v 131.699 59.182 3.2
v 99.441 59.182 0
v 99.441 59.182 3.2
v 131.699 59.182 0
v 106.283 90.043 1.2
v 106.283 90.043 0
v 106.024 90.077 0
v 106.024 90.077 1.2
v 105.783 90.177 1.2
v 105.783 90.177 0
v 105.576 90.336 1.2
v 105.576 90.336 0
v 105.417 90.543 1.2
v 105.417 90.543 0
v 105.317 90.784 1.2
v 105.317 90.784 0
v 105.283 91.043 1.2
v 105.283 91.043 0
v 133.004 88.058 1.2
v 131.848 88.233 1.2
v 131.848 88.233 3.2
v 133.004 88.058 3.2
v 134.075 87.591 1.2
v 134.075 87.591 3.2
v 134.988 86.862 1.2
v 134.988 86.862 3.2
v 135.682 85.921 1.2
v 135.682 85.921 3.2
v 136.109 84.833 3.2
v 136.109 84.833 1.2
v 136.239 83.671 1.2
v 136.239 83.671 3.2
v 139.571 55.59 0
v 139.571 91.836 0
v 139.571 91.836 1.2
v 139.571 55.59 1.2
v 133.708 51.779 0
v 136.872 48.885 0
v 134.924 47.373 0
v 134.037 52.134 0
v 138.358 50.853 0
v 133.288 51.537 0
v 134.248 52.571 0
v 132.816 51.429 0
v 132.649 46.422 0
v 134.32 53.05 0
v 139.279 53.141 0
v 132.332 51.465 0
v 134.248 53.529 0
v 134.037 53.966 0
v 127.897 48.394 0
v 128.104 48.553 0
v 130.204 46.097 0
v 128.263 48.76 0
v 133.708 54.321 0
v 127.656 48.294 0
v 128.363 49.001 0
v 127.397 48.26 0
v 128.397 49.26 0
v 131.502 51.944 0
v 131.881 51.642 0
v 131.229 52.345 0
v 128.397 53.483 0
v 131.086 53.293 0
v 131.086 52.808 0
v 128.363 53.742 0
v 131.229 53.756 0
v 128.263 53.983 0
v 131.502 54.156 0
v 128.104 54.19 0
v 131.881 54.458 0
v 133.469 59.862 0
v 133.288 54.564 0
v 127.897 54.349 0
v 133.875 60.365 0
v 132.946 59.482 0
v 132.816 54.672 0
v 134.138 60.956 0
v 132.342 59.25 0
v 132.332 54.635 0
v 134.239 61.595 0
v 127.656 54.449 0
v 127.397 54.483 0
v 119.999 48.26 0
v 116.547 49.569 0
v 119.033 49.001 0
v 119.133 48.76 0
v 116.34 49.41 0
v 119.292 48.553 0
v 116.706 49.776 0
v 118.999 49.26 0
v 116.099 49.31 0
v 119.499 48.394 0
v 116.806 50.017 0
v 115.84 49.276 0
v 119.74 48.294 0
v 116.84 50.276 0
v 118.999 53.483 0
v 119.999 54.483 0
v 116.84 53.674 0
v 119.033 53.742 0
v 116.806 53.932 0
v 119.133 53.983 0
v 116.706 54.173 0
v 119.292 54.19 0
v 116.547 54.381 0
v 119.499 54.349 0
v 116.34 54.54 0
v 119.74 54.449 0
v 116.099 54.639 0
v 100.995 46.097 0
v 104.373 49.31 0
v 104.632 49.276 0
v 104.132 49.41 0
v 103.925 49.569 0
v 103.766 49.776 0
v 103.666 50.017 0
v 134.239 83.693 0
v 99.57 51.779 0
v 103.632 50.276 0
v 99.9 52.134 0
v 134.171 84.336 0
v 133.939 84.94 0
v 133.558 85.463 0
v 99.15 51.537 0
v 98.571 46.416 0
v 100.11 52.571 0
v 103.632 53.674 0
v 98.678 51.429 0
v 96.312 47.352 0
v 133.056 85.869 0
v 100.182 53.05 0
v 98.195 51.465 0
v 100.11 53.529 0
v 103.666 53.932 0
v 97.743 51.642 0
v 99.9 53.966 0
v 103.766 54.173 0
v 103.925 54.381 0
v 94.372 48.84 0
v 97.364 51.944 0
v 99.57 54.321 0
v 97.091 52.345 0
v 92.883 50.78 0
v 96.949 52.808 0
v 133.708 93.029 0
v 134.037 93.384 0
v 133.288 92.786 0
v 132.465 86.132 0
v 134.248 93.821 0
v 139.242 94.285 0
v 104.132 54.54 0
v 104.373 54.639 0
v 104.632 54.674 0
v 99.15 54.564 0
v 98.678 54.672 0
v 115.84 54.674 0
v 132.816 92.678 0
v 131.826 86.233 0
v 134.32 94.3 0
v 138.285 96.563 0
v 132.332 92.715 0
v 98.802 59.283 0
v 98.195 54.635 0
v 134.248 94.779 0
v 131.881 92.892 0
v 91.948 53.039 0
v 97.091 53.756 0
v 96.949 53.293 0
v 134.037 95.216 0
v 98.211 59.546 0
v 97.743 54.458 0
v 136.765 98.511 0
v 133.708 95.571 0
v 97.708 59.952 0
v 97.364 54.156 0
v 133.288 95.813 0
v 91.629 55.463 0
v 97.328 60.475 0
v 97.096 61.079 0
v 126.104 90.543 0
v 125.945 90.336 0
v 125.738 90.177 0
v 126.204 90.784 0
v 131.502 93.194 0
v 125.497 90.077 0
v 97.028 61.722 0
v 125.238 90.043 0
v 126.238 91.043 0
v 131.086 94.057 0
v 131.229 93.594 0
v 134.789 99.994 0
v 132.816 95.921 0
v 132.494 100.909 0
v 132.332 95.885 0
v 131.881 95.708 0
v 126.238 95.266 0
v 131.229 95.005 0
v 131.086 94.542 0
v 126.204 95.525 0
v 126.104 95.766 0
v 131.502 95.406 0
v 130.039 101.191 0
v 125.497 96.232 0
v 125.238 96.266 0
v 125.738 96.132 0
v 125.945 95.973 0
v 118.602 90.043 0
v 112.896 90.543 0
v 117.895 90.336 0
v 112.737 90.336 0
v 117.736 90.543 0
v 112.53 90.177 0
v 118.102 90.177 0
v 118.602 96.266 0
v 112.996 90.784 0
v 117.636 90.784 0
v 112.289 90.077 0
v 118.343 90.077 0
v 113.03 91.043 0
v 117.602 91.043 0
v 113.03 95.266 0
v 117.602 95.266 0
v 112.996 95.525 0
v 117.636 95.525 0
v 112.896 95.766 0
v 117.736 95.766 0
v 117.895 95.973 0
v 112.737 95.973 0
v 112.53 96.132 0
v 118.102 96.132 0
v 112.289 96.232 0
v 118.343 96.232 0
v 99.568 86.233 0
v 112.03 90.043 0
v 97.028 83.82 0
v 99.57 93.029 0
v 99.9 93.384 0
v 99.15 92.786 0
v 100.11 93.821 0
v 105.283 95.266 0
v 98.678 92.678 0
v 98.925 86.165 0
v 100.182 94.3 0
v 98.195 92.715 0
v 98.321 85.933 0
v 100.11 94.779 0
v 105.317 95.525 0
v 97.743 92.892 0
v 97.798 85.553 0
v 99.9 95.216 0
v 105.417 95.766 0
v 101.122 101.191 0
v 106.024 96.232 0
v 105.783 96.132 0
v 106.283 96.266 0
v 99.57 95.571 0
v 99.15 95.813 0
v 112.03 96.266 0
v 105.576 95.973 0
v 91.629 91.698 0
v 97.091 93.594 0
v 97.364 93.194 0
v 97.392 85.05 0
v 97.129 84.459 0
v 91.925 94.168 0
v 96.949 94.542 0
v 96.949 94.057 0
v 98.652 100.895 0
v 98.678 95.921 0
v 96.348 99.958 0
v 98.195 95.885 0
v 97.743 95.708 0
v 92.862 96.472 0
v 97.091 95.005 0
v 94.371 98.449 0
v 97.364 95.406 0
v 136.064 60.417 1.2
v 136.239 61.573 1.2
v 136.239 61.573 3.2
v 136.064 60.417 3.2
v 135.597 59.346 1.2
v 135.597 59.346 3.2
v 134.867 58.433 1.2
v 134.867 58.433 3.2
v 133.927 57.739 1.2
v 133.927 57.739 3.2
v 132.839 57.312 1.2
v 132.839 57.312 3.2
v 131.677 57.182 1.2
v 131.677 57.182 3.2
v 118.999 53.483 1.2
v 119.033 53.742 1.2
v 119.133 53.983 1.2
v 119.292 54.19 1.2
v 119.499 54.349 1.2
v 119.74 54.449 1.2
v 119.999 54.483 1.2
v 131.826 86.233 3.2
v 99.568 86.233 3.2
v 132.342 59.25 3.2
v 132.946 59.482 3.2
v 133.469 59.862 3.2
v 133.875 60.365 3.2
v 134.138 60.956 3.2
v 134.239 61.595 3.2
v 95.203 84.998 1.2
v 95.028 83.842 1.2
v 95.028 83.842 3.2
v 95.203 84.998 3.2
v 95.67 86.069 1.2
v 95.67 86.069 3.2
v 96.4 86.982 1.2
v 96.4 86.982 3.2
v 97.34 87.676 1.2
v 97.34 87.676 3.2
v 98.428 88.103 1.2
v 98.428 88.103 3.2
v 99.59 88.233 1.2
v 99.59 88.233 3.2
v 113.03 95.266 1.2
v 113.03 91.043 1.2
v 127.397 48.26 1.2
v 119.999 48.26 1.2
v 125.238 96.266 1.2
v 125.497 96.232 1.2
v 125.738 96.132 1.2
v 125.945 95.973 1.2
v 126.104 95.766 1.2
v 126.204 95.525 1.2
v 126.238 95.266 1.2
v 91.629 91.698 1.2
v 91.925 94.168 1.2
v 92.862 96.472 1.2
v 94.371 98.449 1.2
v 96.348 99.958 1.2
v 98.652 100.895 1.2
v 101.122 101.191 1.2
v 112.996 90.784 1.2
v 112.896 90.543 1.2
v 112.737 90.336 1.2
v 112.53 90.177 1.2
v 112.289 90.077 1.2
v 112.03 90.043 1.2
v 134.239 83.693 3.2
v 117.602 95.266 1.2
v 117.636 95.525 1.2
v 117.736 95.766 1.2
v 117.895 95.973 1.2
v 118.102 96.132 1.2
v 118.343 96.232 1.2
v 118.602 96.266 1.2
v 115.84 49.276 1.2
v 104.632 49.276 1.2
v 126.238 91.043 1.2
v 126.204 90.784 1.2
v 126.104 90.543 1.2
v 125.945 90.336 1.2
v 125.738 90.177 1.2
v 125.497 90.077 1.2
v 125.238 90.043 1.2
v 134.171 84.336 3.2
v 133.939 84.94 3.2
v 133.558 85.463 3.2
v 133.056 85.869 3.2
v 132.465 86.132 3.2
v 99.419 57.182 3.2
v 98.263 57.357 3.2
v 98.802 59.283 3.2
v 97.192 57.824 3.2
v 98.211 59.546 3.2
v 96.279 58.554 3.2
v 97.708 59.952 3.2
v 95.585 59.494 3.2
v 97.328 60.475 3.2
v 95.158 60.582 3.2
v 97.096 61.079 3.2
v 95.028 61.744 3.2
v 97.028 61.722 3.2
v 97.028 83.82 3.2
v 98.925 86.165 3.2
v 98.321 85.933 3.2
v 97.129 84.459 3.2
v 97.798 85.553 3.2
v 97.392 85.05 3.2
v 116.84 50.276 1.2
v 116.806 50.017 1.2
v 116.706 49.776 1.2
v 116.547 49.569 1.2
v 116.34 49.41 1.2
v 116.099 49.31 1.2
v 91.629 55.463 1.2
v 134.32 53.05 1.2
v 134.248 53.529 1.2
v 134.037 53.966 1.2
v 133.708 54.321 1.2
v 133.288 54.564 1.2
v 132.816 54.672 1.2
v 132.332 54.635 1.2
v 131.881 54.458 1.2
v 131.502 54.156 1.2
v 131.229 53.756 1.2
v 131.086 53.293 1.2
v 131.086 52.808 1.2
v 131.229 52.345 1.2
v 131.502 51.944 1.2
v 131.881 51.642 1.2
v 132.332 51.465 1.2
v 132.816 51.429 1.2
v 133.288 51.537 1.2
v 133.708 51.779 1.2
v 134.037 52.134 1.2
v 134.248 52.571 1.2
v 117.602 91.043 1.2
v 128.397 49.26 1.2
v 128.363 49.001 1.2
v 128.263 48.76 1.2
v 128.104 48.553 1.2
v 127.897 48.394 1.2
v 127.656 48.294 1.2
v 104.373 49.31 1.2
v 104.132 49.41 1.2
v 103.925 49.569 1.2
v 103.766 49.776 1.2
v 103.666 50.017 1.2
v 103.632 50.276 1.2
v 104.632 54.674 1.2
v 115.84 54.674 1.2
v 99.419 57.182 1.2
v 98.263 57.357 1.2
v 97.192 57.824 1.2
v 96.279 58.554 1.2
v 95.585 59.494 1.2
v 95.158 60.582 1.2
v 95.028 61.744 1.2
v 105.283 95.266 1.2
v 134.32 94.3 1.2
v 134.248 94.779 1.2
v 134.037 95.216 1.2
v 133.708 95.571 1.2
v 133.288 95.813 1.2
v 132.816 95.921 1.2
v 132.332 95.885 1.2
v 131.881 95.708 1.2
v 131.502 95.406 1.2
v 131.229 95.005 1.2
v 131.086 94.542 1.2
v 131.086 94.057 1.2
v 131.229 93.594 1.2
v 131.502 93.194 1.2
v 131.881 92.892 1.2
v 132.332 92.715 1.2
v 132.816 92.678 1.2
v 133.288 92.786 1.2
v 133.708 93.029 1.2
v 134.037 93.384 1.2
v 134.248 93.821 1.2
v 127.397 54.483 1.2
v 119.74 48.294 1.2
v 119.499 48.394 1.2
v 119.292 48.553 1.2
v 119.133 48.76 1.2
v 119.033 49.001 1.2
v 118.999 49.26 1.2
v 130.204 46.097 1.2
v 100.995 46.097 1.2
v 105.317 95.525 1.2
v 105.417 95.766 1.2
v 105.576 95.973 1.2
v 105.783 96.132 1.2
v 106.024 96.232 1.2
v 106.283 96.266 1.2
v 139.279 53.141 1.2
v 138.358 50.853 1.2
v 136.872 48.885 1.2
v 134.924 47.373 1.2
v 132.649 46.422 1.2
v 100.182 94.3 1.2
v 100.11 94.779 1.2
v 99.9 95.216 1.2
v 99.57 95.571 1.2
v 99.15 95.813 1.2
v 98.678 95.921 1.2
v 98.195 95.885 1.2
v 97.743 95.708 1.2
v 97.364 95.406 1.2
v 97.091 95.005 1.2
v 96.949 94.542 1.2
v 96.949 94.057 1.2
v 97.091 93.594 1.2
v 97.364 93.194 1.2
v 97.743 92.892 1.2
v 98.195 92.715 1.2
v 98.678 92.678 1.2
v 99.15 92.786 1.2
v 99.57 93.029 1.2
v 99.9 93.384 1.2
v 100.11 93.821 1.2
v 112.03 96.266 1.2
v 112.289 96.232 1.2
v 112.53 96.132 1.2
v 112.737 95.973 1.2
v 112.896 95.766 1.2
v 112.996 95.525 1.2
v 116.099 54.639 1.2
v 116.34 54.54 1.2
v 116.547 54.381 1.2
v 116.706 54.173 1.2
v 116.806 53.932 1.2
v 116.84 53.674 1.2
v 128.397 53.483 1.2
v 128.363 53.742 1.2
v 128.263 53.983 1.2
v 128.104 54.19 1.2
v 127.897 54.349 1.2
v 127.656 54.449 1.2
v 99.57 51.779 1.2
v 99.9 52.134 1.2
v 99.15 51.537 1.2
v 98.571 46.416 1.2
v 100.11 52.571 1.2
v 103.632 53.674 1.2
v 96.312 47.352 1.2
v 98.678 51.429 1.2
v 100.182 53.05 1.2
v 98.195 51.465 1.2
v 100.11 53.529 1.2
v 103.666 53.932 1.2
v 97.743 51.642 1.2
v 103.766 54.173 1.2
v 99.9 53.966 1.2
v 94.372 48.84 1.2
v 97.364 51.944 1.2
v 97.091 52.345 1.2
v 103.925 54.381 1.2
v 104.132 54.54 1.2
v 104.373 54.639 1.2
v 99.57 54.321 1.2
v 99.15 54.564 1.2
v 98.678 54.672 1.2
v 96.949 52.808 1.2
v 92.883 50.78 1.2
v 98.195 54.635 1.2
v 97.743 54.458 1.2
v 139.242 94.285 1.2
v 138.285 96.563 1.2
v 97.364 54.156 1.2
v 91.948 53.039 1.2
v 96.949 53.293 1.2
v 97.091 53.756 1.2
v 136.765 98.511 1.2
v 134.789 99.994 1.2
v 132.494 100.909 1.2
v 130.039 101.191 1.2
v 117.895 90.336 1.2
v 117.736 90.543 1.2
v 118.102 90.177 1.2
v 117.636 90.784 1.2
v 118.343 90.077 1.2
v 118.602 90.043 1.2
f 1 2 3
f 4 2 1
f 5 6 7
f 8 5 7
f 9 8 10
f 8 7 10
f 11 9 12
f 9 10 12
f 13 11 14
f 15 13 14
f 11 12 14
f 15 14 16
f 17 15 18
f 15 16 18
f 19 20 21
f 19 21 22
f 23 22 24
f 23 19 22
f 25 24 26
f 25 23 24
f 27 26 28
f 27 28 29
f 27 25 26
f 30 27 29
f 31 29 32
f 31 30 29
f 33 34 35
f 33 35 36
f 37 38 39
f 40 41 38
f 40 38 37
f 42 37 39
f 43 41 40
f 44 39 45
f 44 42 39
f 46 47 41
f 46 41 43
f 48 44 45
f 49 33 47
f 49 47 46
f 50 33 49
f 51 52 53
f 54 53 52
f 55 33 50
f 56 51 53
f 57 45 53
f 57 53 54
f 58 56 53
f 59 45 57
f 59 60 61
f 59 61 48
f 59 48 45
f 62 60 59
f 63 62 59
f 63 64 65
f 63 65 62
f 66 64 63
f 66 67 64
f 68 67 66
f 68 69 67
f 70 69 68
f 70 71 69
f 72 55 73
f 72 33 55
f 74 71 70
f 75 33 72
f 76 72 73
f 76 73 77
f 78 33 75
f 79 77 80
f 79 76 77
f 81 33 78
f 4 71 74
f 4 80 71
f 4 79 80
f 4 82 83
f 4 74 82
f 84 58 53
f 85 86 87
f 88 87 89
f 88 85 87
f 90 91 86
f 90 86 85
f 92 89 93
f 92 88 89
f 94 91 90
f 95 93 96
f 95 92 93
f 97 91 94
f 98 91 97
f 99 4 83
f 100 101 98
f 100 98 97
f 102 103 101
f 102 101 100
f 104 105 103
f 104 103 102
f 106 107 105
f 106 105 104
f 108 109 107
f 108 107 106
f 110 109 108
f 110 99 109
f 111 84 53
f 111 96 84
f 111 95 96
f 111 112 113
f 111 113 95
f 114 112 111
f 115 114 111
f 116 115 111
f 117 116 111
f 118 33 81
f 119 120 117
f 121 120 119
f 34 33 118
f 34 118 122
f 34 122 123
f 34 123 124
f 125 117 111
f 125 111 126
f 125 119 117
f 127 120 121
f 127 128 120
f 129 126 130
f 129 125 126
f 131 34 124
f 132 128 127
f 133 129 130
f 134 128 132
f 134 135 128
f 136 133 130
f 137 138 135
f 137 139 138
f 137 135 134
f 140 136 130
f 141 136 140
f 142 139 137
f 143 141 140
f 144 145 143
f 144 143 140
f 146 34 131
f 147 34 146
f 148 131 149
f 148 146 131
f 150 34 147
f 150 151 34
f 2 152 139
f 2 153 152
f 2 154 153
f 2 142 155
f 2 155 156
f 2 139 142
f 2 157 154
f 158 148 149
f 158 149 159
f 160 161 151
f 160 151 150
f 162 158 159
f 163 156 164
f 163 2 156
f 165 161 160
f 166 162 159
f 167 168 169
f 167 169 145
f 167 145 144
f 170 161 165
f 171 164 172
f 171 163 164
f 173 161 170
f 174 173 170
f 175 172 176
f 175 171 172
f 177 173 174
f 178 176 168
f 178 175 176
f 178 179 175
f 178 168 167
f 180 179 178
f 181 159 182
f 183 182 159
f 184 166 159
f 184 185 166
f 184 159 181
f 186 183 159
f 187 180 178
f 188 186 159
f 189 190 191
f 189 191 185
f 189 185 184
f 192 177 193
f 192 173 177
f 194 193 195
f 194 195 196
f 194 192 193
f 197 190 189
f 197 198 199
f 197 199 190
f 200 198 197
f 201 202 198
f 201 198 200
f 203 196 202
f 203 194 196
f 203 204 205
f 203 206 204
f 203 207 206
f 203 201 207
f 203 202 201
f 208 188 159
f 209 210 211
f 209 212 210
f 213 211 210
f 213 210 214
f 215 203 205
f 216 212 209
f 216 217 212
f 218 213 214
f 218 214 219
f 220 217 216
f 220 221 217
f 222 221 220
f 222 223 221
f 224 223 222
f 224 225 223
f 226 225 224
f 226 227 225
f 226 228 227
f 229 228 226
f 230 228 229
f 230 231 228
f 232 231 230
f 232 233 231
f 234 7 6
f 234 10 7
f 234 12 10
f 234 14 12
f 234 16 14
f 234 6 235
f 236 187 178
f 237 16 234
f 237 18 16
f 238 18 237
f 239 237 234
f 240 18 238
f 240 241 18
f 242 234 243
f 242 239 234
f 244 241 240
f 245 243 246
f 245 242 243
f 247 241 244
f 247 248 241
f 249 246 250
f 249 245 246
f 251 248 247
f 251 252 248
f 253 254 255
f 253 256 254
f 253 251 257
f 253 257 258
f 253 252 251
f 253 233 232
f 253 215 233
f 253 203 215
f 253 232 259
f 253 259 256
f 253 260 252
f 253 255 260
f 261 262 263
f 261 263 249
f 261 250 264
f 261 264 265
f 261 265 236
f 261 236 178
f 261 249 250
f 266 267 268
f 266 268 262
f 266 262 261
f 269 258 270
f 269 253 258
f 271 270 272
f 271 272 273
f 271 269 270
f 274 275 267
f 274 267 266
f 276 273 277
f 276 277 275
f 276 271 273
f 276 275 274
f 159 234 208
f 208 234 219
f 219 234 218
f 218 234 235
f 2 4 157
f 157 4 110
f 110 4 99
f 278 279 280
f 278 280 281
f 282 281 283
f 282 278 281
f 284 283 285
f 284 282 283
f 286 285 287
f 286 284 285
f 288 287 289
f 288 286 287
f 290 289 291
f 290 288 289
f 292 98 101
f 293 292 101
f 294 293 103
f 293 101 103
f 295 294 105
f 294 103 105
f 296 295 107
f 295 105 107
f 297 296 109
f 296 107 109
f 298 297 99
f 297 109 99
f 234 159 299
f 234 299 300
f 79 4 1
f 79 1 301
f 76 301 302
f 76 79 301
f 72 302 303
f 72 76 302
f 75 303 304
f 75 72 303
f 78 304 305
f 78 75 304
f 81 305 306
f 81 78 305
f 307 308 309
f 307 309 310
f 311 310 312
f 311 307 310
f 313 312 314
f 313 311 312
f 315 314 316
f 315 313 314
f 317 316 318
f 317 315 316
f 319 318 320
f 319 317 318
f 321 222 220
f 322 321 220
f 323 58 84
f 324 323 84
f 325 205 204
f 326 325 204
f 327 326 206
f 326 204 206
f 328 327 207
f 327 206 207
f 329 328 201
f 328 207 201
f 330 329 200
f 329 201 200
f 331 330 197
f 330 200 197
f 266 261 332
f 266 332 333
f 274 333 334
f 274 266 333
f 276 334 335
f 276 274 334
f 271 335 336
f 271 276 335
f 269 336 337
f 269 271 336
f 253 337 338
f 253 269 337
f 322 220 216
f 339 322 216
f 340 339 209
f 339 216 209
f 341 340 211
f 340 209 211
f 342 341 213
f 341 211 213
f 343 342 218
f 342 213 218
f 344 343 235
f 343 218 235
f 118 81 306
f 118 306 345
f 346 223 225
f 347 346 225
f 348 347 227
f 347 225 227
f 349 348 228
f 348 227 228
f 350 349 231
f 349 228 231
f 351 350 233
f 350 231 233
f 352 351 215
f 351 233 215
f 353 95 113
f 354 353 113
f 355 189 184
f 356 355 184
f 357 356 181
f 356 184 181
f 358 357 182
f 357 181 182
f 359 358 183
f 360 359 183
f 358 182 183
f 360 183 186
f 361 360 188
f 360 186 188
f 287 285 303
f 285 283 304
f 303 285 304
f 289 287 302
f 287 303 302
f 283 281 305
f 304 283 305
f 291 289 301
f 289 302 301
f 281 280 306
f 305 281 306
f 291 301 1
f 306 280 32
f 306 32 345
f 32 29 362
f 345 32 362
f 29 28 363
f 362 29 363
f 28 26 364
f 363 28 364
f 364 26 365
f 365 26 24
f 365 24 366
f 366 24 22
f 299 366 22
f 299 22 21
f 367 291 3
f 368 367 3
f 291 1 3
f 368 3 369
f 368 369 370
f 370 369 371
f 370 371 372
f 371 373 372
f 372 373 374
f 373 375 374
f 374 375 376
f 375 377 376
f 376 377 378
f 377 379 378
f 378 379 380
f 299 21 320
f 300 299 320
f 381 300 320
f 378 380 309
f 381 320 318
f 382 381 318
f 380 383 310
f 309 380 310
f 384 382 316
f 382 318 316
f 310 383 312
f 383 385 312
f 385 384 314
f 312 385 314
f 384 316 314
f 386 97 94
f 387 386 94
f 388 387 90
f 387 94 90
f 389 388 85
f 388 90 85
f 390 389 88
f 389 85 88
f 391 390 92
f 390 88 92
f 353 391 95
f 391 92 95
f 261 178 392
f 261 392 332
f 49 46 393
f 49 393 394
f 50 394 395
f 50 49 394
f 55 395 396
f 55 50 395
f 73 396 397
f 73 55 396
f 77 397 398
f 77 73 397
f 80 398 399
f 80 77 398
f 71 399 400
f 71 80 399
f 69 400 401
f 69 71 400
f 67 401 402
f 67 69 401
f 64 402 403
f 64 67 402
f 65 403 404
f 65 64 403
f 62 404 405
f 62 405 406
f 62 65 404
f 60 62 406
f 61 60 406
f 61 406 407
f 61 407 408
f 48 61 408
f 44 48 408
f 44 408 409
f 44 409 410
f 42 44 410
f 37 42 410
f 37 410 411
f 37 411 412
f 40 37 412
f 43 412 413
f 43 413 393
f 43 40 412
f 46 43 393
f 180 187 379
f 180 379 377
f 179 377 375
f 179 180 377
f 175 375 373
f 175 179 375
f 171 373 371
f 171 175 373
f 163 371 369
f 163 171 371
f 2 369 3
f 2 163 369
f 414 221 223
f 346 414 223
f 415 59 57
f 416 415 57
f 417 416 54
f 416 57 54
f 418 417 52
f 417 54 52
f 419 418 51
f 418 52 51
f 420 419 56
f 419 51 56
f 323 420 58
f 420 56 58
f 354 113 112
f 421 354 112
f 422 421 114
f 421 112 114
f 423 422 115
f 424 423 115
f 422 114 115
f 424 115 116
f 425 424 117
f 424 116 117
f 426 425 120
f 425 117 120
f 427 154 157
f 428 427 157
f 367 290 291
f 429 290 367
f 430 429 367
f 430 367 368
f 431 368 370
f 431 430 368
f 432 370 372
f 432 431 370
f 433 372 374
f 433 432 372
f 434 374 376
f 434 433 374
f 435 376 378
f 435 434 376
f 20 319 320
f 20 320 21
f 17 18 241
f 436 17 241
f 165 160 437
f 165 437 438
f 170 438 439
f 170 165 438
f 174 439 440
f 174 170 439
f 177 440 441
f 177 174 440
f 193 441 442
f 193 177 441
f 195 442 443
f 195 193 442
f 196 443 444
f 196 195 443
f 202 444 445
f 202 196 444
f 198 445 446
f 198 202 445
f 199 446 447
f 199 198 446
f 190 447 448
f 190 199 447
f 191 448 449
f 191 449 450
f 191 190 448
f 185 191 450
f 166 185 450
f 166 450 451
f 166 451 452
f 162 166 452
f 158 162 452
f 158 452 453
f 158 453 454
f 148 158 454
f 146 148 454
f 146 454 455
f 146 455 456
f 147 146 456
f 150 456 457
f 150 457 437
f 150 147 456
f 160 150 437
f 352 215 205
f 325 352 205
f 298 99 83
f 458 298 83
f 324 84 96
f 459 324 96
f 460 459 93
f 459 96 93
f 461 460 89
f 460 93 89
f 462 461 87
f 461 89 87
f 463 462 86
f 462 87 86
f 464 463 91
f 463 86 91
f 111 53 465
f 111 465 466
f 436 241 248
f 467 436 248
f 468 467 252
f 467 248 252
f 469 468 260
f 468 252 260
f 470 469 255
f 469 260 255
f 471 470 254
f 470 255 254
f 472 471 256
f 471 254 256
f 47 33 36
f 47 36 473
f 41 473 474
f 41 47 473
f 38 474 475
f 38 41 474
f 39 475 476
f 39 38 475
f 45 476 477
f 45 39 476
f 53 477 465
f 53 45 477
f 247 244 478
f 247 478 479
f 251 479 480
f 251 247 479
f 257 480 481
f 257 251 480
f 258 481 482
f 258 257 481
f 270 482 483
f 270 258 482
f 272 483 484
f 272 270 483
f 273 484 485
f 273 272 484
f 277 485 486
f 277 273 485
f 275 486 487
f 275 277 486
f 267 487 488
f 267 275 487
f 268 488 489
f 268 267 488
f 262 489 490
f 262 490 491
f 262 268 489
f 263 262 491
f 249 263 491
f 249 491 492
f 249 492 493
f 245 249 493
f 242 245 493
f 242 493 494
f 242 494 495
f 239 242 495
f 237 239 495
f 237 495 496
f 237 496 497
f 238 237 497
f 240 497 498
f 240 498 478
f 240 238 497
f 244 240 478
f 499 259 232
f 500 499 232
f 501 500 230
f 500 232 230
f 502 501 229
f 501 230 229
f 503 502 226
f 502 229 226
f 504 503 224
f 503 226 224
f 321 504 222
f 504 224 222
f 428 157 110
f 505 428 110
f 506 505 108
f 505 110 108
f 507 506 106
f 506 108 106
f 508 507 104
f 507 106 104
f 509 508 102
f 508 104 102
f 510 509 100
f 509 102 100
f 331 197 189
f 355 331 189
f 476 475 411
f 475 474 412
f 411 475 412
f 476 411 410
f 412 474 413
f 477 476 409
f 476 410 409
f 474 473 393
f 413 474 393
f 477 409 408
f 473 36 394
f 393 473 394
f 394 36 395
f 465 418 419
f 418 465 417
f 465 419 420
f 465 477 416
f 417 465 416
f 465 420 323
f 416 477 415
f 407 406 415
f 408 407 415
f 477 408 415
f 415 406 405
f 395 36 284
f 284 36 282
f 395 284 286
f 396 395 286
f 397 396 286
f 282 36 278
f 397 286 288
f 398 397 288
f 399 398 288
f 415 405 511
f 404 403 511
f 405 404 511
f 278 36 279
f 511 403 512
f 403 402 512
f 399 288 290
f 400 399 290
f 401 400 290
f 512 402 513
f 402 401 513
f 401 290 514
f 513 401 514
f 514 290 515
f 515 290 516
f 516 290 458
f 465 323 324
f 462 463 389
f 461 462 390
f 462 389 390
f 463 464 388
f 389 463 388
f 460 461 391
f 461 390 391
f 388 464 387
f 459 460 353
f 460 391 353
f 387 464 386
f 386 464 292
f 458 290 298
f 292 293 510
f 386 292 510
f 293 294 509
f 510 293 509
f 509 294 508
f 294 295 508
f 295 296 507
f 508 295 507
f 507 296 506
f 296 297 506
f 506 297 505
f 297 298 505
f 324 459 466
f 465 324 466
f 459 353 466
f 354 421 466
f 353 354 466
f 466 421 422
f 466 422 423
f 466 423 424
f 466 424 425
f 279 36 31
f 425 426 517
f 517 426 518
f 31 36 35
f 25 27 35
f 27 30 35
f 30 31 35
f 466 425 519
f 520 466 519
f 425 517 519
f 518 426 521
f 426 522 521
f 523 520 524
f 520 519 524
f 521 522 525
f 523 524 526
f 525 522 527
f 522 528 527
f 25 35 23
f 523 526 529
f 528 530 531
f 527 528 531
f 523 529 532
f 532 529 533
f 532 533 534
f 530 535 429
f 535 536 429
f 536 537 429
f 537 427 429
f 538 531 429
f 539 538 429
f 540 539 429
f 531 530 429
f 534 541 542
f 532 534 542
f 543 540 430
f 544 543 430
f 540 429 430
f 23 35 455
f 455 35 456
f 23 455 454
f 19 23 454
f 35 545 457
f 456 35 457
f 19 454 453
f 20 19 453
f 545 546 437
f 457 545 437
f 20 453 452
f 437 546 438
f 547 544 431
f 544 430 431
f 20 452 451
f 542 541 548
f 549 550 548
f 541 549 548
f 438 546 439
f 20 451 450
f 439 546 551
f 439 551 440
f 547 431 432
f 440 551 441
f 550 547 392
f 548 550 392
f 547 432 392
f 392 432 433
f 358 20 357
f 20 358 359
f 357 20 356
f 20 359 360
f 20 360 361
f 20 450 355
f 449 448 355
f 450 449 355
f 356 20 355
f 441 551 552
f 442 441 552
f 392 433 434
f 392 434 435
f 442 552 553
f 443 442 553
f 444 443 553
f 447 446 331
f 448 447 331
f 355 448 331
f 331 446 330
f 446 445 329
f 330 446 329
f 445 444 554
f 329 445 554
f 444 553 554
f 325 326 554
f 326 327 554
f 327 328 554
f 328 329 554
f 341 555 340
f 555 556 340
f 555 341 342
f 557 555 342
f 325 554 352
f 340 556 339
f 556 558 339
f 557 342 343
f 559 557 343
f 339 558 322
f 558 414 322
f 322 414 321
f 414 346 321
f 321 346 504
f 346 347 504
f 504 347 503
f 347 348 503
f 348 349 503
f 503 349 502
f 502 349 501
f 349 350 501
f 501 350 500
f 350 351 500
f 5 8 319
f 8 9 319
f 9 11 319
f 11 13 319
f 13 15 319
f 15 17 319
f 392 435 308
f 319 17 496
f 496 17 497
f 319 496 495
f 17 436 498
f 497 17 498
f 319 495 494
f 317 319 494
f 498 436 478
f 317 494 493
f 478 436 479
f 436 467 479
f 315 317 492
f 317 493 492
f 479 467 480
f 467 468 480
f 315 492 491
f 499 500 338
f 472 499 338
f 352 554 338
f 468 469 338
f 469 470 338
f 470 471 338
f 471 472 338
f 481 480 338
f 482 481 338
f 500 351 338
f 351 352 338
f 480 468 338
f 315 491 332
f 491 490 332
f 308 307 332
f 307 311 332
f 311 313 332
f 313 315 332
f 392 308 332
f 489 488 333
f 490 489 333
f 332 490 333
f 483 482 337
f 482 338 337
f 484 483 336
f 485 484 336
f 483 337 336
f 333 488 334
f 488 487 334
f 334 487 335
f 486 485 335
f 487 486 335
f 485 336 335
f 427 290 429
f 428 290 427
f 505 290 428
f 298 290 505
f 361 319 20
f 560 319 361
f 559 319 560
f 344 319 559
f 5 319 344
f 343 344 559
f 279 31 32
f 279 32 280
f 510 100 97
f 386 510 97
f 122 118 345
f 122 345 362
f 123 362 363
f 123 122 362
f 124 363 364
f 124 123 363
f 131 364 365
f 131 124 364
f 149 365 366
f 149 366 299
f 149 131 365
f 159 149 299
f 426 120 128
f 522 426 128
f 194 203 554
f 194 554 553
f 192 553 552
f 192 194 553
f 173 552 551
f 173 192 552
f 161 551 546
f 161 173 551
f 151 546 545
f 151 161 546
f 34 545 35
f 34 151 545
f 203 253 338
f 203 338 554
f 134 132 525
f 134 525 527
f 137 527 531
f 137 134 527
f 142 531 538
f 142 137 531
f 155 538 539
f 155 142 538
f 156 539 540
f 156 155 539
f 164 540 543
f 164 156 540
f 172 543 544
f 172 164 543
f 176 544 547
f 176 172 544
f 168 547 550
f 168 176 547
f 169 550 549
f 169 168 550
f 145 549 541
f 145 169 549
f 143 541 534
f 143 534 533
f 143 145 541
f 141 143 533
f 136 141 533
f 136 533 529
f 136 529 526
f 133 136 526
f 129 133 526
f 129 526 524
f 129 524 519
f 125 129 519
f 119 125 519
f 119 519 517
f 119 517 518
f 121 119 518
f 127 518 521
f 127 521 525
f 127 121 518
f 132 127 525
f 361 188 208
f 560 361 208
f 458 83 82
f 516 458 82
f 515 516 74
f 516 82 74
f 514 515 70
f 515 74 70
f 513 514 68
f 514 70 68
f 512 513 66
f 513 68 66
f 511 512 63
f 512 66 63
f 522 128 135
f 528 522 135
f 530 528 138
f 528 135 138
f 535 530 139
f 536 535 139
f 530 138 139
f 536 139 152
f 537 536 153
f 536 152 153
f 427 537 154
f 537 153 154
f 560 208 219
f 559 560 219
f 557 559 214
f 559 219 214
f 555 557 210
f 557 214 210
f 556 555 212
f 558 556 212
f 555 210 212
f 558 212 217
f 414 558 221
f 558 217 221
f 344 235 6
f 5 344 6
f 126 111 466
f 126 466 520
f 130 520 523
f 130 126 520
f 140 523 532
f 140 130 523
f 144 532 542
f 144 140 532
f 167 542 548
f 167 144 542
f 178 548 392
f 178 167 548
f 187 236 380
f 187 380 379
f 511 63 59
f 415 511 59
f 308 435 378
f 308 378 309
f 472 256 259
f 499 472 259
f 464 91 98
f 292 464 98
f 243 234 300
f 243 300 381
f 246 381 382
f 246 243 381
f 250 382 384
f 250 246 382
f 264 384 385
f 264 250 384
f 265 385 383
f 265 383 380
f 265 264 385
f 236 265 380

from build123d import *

# Parameters (mm, degrees)
MODEL_R         = 1.62599878
EXTRUDE_1_DEPTH = 1.2
EXTRUDE_2_DEPTH = 3.2


with BuildPart() as part:
    # Model → 凸台-拉伸1 (new body)
    with BuildSketch(Plane.XY):
        with BuildLine():
            Line((91.62866358, 91.6983307), (91.62866358, 55.46333332))
            ThreePointArc((91.62866358, 55.46333332), (94.371901783, 48.840435823), (100.99479928, 46.09719762))
            Line((100.99479928, 46.09719762), (130.2038036, 46.09719762))
            ThreePointArc((130.2038036, 46.09719762), (136.872269667, 48.885177471), (139.57079782, 55.59034094))
            Line((139.57079782, 55.59034094), (139.57079782, 91.83599362))
            ThreePointArc((139.57079782, 91.83599362), (136.765388235, 98.511299019), (130.03882044, 101.19146894))
            Line((130.03882044, 101.19146894), (101.12180182, 101.19146894))
            ThreePointArc((101.12180182, 101.19146894), (94.371333169, 98.448799351), (91.62866358, 91.6983307))
        make_face()
        with Locations((98.55639928, 53.0501987)):
            Circle(MODEL_R, mode=Mode.SUBTRACT)
        with BuildLine():
            ThreePointArc((104.632, 49.276), (103.924893219, 49.568893219), (103.632, 50.276))
            Line((103.632, 50.276), (103.632, 53.6735))
            ThreePointArc((103.632, 53.6735), (103.924893219, 54.380606781), (104.632, 54.6735))
            Line((104.632, 54.6735), (115.84, 54.6735))
            ThreePointArc((115.84, 54.6735), (116.547106781, 54.380606781), (116.84, 53.6735))
            Line((116.84, 53.6735), (116.84, 50.276))
            ThreePointArc((116.84, 50.276), (116.547106781, 49.568893219), (115.84, 49.276))
            Line((115.84, 49.276), (104.632, 49.276))
        make_face(mode=Mode.SUBTRACT)
        with BuildLine():
            ThreePointArc((119.999, 48.26), (119.291893219, 48.552893219), (118.999, 49.26))
            Line((118.999, 49.26), (118.999, 53.483))
            ThreePointArc((118.999, 53.483), (119.291893219, 54.190106781), (119.999, 54.483))
            Line((119.999, 54.483), (127.397, 54.483))
            ThreePointArc((127.397, 54.483), (128.104106781, 54.190106781), (128.397, 53.483))
            Line((128.397, 53.483), (128.397, 49.26))
            ThreePointArc((128.397, 49.26), (128.104106781, 48.552893219), (127.397, 48.26))
            Line((127.397, 48.26), (119.999, 48.26))
        make_face(mode=Mode.SUBTRACT)
        with Locations((132.69399928, 53.0501987)):
            Circle(MODEL_R, mode=Mode.SUBTRACT)
        with BuildLine():
            ThreePointArc((99.419126585, 57.181997458), (96.27876767, 58.553502055), (95.028, 61.743871815))
            Line((95.028, 61.743871815), (95.028, 83.841870988))
            ThreePointArc((95.028, 83.841870988), (96.399503395, 86.982228572), (99.58987085, 88.232997462))
            Line((99.58987085, 88.232997462), (131.847868221, 88.233000002))
            ThreePointArc((131.847868221, 88.233000002), (134.988140962, 86.861585383), (136.239, 83.671374948))
            Line((136.239, 83.671374948), (136.239, 61.573126472))
            ThreePointArc((136.239, 61.573126472), (134.867496605, 58.432768888), (131.67712915, 57.181999998))
            Line((131.67712915, 57.181999998), (99.419126585, 57.181997458))
        make_face(mode=Mode.SUBTRACT)
        with Locations((98.55639928, 94.2997987)):
            Circle(MODEL_R, mode=Mode.SUBTRACT)
        with BuildLine():
            ThreePointArc((106.283, 90.043), (105.575893219, 90.335893219), (105.283, 91.043))
            Line((105.283, 91.043), (105.283, 95.266))
            ThreePointArc((105.283, 95.266), (105.575893219, 95.973106781), (106.283, 96.266))
            Line((106.283, 96.266), (112.03, 96.266))
            ThreePointArc((112.03, 96.266), (112.737106781, 95.973106781), (113.03, 95.266))
            Line((113.03, 95.266), (113.03, 91.043))
            ThreePointArc((113.03, 91.043), (112.737106781, 90.335893219), (112.03, 90.043))
            Line((112.03, 90.043), (106.283, 90.043))
        make_face(mode=Mode.SUBTRACT)
        with BuildLine():
            ThreePointArc((117.602, 95.266), (117.894893219, 95.973106781), (118.602, 96.266))
            Line((118.602, 96.266), (125.238, 96.266))
            ThreePointArc((125.238, 96.266), (125.945106781, 95.973106781), (126.238, 95.266))
            Line((126.238, 95.266), (126.238, 91.043))
            ThreePointArc((126.238, 91.043), (125.945106781, 90.335893219), (125.238, 90.043))
            Line((125.238, 90.043), (118.602, 90.043))
            ThreePointArc((118.602, 90.043), (117.894893219, 90.335893219), (117.602, 91.043))
            Line((117.602, 91.043), (117.602, 95.266))
        make_face(mode=Mode.SUBTRACT)
        with Locations((132.69399928, 94.2997987)):
            Circle(MODEL_R, mode=Mode.SUBTRACT)
    extrude(amount=EXTRUDE_1_DEPTH)

    # Model<4> → 凸台-拉伸2 (add)
    with BuildSketch(Plane.XY):
        with BuildLine():
            Line((95.028, 83.841870988), (95.028, 61.743871815))
            ThreePointArc((95.028, 61.743871815), (96.27876767, 58.553502055), (99.419126585, 57.181997458))
            Line((99.419126585, 57.181997458), (131.67712915, 57.181999998))
            ThreePointArc((131.67712915, 57.181999998), (134.867496605, 58.432768888), (136.239, 61.573126472))
            Line((136.239, 61.573126472), (136.239, 83.671374948))
            ThreePointArc((136.239, 83.671374948), (134.988140962, 86.861585383), (131.847868221, 88.233000002))
            Line((131.847868221, 88.233000002), (99.58987085, 88.232997462))
            ThreePointArc((99.58987085, 88.232997462), (96.399503395, 86.982228572), (95.028, 83.841870988))
        make_face()
        with BuildLine():
            Line((134.239, 83.69318288), (134.239, 61.59499746))
            ThreePointArc((134.239, 61.59499746), (133.468748117, 59.862447526), (131.699, 59.182))
            Line((131.699, 59.182), (99.44099746, 59.18199746))
            ThreePointArc((99.44099746, 59.18199746), (97.708446609, 59.952250241), (97.028, 61.722))
            Line((97.028, 61.722), (97.028, 83.82))
            ThreePointArc((97.028, 83.82), (97.798251883, 85.552549934), (99.568, 86.23299746))
            Line((99.568, 86.23299746), (131.82599746, 86.233))
            ThreePointArc((131.82599746, 86.233), (133.558484649, 85.46281457), (134.239, 83.69318288))
        make_face(mode=Mode.SUBTRACT)
    extrude(amount=EXTRUDE_2_DEPTH)


solid = part.part
